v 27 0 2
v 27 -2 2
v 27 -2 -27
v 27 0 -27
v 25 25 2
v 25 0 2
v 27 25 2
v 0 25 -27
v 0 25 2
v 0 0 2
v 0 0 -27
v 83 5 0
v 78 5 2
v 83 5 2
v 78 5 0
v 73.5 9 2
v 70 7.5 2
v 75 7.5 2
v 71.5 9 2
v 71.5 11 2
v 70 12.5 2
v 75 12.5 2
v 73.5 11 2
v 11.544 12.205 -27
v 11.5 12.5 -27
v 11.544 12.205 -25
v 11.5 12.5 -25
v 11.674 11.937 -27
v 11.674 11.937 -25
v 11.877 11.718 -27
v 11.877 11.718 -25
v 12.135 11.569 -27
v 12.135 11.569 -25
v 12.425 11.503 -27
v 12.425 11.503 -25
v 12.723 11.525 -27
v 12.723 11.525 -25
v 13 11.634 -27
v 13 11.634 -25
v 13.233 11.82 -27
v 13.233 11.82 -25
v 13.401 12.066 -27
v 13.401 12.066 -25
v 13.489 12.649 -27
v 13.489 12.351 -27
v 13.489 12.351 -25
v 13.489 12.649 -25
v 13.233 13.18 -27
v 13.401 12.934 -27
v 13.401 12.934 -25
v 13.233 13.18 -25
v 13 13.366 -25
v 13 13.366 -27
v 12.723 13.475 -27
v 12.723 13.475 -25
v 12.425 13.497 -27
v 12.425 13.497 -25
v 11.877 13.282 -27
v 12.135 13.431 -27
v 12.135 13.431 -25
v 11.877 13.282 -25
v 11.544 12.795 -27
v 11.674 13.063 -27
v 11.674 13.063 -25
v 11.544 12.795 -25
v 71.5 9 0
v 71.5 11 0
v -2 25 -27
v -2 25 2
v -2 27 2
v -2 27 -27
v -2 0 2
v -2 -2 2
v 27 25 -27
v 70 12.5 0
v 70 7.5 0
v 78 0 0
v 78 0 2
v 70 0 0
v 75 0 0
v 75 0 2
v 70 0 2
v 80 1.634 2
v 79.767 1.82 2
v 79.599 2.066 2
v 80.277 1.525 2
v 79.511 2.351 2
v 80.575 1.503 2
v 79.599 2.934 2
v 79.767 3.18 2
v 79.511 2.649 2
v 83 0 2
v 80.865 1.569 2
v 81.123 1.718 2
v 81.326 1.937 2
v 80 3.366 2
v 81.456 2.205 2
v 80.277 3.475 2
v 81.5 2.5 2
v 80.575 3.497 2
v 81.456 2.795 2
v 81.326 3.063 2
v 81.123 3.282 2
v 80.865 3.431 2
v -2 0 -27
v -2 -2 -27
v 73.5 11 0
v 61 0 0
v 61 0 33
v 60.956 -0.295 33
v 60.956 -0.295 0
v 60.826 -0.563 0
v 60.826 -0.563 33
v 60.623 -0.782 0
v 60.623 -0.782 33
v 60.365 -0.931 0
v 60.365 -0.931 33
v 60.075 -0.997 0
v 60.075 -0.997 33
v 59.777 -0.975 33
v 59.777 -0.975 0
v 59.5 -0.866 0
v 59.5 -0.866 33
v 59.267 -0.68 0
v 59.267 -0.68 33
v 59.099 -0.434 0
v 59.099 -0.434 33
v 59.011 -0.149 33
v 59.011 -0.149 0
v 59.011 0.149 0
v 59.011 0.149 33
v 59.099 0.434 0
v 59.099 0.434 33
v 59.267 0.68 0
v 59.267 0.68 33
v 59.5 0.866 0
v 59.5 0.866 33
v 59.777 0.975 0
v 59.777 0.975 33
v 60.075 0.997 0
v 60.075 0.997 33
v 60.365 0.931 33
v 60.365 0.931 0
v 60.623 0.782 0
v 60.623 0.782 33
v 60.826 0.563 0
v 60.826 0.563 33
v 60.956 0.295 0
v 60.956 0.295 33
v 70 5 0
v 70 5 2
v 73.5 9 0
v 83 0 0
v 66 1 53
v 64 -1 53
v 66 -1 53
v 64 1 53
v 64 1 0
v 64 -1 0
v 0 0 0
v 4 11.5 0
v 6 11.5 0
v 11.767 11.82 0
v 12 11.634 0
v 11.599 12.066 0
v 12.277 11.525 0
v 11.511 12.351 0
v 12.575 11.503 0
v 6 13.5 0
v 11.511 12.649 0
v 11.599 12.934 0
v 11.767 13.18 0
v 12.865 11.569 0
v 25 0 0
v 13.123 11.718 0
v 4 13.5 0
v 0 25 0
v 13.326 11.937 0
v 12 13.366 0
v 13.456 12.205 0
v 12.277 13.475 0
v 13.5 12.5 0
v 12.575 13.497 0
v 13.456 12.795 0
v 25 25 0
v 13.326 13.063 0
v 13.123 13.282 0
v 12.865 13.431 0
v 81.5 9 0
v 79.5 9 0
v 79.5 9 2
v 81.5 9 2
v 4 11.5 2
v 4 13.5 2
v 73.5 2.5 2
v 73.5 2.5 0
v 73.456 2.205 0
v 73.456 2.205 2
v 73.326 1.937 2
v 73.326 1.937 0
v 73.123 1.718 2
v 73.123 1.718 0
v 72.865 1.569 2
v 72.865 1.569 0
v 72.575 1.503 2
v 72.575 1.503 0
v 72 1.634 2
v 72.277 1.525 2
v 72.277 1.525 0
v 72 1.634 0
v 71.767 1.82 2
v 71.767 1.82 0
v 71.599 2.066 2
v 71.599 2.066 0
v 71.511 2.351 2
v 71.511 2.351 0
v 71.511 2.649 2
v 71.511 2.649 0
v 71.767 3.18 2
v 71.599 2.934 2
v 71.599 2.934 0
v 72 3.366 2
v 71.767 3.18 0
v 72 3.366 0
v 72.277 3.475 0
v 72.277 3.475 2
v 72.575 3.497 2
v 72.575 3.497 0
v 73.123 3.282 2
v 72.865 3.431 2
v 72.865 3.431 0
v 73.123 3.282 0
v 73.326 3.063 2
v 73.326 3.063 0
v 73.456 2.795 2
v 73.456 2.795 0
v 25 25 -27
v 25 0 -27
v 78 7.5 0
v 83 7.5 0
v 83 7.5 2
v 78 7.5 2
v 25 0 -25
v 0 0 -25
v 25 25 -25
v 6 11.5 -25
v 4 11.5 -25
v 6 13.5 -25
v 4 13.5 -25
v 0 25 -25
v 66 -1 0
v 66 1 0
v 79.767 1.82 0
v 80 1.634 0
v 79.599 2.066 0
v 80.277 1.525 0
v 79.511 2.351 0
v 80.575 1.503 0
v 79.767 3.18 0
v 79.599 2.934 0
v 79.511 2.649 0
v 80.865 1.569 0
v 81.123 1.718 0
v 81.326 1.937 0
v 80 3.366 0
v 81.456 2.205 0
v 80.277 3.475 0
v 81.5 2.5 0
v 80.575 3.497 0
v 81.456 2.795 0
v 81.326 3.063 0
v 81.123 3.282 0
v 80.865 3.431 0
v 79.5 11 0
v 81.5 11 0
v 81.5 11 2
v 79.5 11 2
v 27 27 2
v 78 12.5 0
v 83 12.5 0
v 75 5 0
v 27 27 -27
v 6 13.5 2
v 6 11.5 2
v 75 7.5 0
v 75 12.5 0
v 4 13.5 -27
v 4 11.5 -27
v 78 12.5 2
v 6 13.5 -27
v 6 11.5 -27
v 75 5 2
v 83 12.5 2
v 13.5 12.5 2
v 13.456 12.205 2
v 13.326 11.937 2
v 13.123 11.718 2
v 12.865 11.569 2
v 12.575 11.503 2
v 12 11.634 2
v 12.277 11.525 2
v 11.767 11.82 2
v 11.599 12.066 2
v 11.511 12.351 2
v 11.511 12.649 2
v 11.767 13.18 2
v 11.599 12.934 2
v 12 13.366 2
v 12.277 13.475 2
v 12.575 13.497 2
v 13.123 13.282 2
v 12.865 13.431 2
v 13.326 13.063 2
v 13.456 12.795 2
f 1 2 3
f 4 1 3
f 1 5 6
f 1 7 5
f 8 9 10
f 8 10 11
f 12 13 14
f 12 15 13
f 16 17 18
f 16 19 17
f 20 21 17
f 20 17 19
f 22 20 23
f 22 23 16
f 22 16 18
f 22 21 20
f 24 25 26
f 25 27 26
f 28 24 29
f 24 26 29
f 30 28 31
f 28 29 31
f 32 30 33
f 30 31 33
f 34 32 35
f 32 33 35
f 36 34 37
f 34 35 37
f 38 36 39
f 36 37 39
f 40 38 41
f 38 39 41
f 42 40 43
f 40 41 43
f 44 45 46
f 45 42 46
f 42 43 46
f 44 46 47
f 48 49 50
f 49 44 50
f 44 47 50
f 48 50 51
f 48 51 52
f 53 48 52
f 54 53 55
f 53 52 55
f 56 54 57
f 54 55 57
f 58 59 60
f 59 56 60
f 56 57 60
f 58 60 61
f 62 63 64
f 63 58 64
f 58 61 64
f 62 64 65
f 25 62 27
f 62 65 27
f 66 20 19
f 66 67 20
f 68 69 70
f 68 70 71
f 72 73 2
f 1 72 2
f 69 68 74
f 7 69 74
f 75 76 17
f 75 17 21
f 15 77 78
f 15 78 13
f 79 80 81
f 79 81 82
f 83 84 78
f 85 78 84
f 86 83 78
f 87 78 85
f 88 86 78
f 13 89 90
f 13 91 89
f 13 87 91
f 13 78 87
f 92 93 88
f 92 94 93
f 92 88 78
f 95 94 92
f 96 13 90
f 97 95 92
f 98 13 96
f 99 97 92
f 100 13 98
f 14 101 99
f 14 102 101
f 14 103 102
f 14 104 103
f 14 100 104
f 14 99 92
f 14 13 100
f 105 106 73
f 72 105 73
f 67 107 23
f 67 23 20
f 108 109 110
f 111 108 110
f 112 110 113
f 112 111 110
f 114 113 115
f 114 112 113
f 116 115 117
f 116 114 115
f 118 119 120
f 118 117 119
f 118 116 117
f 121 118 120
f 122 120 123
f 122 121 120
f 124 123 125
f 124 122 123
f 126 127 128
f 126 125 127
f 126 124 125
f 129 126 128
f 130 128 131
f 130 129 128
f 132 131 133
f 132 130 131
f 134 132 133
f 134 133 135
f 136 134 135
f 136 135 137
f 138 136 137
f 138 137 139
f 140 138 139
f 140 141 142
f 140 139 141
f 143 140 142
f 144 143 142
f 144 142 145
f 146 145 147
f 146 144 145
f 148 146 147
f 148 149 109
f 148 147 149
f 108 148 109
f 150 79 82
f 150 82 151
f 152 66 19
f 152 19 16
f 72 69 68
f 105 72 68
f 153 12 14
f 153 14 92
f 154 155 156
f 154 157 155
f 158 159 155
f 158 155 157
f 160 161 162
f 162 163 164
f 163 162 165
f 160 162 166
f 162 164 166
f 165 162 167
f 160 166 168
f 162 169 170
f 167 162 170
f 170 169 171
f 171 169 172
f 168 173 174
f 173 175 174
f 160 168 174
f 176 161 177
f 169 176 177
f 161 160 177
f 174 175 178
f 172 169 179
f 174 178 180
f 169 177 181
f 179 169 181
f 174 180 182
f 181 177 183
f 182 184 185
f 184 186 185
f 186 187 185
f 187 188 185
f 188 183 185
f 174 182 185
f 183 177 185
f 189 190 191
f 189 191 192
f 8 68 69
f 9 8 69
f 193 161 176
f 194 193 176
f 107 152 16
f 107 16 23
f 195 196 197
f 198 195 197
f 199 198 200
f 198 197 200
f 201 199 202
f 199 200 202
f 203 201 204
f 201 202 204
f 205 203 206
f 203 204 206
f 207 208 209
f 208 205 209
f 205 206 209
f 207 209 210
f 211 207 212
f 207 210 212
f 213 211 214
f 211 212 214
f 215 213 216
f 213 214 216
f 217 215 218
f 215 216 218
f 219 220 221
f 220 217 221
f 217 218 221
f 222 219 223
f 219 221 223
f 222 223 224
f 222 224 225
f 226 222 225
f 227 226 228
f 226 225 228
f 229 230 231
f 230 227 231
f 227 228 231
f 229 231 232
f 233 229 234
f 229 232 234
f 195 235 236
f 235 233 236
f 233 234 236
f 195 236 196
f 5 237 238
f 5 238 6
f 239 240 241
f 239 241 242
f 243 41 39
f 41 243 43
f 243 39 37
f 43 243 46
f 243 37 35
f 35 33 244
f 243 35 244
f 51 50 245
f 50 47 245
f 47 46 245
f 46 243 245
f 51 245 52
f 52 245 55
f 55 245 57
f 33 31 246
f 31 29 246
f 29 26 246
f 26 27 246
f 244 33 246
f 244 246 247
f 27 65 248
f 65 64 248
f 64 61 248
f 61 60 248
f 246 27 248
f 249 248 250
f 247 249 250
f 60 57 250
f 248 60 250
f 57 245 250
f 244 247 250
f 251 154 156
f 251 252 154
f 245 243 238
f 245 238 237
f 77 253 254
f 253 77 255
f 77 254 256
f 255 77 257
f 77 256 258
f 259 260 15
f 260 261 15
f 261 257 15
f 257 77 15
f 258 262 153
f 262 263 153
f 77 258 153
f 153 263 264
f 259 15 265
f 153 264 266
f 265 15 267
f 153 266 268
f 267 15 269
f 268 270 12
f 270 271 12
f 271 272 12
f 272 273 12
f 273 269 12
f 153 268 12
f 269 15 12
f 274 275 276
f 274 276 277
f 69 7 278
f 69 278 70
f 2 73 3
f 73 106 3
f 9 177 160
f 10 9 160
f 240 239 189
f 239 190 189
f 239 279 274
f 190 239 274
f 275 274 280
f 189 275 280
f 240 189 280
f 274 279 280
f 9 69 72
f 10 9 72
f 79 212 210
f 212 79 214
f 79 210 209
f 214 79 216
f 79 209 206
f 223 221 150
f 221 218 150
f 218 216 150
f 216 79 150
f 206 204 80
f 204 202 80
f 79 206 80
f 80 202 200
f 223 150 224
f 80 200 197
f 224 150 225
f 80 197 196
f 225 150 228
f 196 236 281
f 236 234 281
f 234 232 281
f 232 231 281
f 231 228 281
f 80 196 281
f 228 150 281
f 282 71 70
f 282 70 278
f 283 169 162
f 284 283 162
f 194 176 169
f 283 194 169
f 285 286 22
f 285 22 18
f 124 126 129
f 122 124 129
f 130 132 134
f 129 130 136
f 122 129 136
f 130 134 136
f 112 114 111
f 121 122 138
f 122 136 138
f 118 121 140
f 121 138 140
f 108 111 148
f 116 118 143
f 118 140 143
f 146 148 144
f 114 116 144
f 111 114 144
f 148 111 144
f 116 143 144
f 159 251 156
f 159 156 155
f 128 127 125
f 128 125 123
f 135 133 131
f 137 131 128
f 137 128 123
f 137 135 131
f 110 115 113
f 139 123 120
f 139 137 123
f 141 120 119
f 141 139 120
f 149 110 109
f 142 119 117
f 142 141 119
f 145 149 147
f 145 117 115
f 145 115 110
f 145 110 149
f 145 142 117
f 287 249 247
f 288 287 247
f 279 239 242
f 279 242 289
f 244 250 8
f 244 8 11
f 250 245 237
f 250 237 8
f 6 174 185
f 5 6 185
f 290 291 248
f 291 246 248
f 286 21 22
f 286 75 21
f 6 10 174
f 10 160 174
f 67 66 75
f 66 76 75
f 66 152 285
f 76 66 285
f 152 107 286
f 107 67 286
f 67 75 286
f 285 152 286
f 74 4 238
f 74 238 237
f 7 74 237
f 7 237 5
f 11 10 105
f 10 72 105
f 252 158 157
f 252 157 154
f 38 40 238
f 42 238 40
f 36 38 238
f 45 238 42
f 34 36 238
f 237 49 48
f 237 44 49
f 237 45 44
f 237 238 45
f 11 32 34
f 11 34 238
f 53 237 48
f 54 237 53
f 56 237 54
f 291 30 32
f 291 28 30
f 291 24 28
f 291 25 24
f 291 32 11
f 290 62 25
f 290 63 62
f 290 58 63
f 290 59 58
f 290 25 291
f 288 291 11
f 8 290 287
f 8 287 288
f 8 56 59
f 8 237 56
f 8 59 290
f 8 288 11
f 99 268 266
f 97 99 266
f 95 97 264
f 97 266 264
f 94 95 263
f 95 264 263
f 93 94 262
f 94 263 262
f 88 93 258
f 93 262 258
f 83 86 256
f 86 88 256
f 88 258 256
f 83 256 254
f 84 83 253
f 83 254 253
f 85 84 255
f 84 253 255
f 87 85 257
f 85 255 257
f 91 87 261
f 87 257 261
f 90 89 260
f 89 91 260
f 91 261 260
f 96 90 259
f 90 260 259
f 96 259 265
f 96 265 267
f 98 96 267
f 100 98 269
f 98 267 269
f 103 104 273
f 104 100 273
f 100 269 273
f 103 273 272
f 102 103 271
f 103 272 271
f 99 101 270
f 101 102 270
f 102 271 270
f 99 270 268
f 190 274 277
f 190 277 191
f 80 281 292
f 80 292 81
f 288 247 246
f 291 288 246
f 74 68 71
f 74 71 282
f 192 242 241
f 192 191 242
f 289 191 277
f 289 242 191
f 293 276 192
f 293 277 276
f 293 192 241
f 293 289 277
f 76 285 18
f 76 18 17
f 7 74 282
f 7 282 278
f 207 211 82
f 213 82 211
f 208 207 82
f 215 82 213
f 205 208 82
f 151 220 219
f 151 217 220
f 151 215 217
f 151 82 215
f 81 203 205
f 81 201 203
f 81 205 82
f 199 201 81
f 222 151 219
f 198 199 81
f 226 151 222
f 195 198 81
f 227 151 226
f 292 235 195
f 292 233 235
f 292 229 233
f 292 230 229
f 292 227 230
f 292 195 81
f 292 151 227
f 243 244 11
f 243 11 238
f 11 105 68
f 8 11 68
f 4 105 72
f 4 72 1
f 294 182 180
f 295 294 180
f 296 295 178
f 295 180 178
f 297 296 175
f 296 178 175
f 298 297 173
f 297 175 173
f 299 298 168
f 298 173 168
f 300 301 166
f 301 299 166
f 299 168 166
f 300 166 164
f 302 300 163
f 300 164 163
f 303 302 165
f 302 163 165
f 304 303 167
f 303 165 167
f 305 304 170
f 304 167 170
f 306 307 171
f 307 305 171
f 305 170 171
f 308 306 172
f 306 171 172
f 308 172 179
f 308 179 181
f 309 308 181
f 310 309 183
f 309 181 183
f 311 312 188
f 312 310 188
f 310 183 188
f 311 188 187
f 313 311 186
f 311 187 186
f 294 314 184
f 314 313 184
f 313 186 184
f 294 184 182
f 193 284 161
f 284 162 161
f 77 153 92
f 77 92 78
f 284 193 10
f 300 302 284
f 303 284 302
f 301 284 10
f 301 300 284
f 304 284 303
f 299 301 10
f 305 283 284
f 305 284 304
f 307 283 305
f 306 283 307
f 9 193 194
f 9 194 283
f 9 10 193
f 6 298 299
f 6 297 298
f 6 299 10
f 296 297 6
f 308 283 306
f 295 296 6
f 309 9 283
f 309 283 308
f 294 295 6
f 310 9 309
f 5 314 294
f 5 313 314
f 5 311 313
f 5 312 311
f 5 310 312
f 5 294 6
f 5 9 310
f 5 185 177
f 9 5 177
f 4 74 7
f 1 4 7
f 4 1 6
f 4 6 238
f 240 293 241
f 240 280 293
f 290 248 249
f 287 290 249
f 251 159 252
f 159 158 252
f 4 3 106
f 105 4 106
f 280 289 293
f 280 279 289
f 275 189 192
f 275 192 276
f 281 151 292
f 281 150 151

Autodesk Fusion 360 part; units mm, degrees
sketch "スケッチ1" plane through (0, 0, 0) normal (0, 0, 1) x (1, 0, 0)
  line L0 (0, 0) -> (25, 0)
  line L1 (25, 0) -> (25, 25)
  line L2 (25, 25) -> (0, 25)
  line L3 (0, 25) -> (0, 0)
  line L4 (30, 25) -> (55, 25)
  line L5 (55, 25) -> (55, 0)
  line L6 (55, 0) -> (30, 0)
  line L7 (30, 0) -> (30, 25)
  line L8 (0, 59) -> (29, 59)
  line L9 (29, 59) -> (29, 30)
  line L10 (29, 30) -> (0, 30)
  line L11 (0, 30) -> (0, 59)
  line L12 (30, 30) -> (59, 30)
  line L13 (59, 30) -> (59, 59)
  line L14 (59, 59) -> (30, 59)
  line L15 (30, 59) -> (30, 30)
  line L16 (0, 65) -> (29, 65)
  line L17 (29, 65) -> (29, 90)
  line L18 (29, 90) -> (0, 90)
  line L19 (0, 90) -> (0, 65)
  line L20 (30, 90) -> (59, 90)
  line L21 (59, 90) -> (59, 65)
  line L22 (59, 65) -> (30, 65)
  line L23 (30, 65) -> (30, 90)
  circle A0 centre (12.5, 12.5) radius 1
  circle A1 centre (42.5, 12.5) radius 1
  line L24 (4, 13.5) -> (6, 13.5)
  line L25 (6, 13.5) -> (6, 11.5)
  line L26 (6, 11.5) -> (4, 11.5)
  line L27 (4, 11.5) -> (4, 13.5)
  line L28 (49, 13.5) -> (51, 13.5)
  line L29 (51, 13.5) -> (51, 11.5)
  line L30 (51, 11.5) -> (49, 11.5)
  line L31 (49, 11.5) -> (49, 13.5)
  circle A2 centre (60, 0) radius 1
  line L32 (64, 1) -> (66, 1)
  line L33 (66, 1) -> (66, -1)
  line L34 (66, -1) -> (64, -1)
  line L35 (64, -1) -> (64, 1)
  line L36 (70, 5) -> (75, 5)
  line L37 (75, 5) -> (75, 0)
  line L38 (75, 0) -> (70, 0)
  line L39 (70, 0) -> (70, 5)
  circle A3 centre (72.5, 2.5) radius 1
  line L40 (70, 12.5) -> (75, 12.5)
  line L41 (75, 12.5) -> (75, 7.5)
  line L42 (75, 7.5) -> (70, 7.5)
  line L43 (70, 7.5) -> (70, 12.5)
  line L44 (73.5, 11) -> (71.5, 11)
  line L45 (71.5, 11) -> (71.5, 9)
  line L46 (71.5, 9) -> (73.5, 9)
  line L47 (73.5, 9) -> (73.5, 11)
  line L48 (73.5, 11) -> (71.5, 9) construction
  line L49 (71.5, 11) -> (73.5, 9) construction
  point P0 (72.5, 10)
  dimension "d13" = 2
extrude "押し出し1" add sketch "スケッチ1" along normal blind 2 contours L0 L1 L2 L3 makes body 1 in component "前"
extrude "押し出し1'" add sketch "スケッチ1" along normal blind 2 separate body contours L4 L5 L6 L7 makes body 2 in component "後"
extrude "押し出し1''" add sketch "スケッチ1" along normal blind 2 separate body contours L8 L9 L10 L11 makes body 3 in component "上"
extrude "押し出し1'''" add sketch "スケッチ1" along normal blind 2 separate body contours L12 L13 L14 L15 makes body 4 in component "下"
extrude "押し出し1''''" add sketch "スケッチ1" along normal blind 2 separate body contours L16 L17 L18 L19 makes body 5 in component "左"
extrude "押し出し1'''''" add sketch "スケッチ1" along normal blind 2 separate body contours L20 L21 L22 L23 makes body 6 in component "右"
extrude "押し出し1''''''" add sketch "スケッチ1" along normal blind 53 separate body contours L32 L33 L34 L35 makes body 7 in component "スライド軸"
extrude "押し出し1'''''''" add sketch "スケッチ1" along normal blind 33 separate body contours A2 makes body 8 in component "回転軸"
extrude "押し出し1''''''''" add sketch "スケッチ1" along normal blind 2 separate body contours L36 L37 L38 L39 makes body 9 in component "回転軸止め輪"
extrude "押し出し1'''''''''" add sketch "スケッチ1" along normal blind 2 separate body contours L40 L41 L42 L43 makes body 10 in component "スライド軸止め輪"
component "前" placed x (1, 0, 0) y (0, 1, 0) z (0, 0, 1) at (0, 0, 0)
component "後" placed x (-1, 0, 0) y (0, 1, 0) z (0, 0, -1) at (55, 0, -25)
component "上" placed x (1, 0, 0) y (0, 0, -1) z (0, 1, 0) at (-2, 25, 32)
component "下" placed x (1, 0, 0) y (0, 0, -1) z (0, 1, 0) at (-32, -2, 32)
component "左" placed x (0, 0, -1) y (0, 1, 0) z (1, 0, 0) at (-2, -65, 2)
component "右" placed x (0, 0, 1) y (0, 1, 0) z (-1, 0, 0) at (27, -65, -57)
component "スライド軸" placed x (1, 0, 0) y (0, 1, 0) z (0, 0, 1) at (0, 0, 0)
component "回転軸" placed x (1, 0, 0) y (0, 1, 0) z (0, 0, 1) at (0, 0, 0)
component "回転軸止め輪" placed x (1, 0, 0) y (0, 1, 0) z (0, 0, 1) at (0, 0, 0)
component "回転軸止め輪" placed x (1, 0, 0) y (0, 1, 0) z (0, 0, 1) at (8, 0, 0)
component "スライド軸止め輪" placed x (1, 0, 0) y (0, 1, 0) z (0, 0, 1) at (0, 0, 0)
component "スライド軸止め輪" placed x (1, 0, 0) y (0, 1, 0) z (0, 0, 1) at (8, 0, 0)
